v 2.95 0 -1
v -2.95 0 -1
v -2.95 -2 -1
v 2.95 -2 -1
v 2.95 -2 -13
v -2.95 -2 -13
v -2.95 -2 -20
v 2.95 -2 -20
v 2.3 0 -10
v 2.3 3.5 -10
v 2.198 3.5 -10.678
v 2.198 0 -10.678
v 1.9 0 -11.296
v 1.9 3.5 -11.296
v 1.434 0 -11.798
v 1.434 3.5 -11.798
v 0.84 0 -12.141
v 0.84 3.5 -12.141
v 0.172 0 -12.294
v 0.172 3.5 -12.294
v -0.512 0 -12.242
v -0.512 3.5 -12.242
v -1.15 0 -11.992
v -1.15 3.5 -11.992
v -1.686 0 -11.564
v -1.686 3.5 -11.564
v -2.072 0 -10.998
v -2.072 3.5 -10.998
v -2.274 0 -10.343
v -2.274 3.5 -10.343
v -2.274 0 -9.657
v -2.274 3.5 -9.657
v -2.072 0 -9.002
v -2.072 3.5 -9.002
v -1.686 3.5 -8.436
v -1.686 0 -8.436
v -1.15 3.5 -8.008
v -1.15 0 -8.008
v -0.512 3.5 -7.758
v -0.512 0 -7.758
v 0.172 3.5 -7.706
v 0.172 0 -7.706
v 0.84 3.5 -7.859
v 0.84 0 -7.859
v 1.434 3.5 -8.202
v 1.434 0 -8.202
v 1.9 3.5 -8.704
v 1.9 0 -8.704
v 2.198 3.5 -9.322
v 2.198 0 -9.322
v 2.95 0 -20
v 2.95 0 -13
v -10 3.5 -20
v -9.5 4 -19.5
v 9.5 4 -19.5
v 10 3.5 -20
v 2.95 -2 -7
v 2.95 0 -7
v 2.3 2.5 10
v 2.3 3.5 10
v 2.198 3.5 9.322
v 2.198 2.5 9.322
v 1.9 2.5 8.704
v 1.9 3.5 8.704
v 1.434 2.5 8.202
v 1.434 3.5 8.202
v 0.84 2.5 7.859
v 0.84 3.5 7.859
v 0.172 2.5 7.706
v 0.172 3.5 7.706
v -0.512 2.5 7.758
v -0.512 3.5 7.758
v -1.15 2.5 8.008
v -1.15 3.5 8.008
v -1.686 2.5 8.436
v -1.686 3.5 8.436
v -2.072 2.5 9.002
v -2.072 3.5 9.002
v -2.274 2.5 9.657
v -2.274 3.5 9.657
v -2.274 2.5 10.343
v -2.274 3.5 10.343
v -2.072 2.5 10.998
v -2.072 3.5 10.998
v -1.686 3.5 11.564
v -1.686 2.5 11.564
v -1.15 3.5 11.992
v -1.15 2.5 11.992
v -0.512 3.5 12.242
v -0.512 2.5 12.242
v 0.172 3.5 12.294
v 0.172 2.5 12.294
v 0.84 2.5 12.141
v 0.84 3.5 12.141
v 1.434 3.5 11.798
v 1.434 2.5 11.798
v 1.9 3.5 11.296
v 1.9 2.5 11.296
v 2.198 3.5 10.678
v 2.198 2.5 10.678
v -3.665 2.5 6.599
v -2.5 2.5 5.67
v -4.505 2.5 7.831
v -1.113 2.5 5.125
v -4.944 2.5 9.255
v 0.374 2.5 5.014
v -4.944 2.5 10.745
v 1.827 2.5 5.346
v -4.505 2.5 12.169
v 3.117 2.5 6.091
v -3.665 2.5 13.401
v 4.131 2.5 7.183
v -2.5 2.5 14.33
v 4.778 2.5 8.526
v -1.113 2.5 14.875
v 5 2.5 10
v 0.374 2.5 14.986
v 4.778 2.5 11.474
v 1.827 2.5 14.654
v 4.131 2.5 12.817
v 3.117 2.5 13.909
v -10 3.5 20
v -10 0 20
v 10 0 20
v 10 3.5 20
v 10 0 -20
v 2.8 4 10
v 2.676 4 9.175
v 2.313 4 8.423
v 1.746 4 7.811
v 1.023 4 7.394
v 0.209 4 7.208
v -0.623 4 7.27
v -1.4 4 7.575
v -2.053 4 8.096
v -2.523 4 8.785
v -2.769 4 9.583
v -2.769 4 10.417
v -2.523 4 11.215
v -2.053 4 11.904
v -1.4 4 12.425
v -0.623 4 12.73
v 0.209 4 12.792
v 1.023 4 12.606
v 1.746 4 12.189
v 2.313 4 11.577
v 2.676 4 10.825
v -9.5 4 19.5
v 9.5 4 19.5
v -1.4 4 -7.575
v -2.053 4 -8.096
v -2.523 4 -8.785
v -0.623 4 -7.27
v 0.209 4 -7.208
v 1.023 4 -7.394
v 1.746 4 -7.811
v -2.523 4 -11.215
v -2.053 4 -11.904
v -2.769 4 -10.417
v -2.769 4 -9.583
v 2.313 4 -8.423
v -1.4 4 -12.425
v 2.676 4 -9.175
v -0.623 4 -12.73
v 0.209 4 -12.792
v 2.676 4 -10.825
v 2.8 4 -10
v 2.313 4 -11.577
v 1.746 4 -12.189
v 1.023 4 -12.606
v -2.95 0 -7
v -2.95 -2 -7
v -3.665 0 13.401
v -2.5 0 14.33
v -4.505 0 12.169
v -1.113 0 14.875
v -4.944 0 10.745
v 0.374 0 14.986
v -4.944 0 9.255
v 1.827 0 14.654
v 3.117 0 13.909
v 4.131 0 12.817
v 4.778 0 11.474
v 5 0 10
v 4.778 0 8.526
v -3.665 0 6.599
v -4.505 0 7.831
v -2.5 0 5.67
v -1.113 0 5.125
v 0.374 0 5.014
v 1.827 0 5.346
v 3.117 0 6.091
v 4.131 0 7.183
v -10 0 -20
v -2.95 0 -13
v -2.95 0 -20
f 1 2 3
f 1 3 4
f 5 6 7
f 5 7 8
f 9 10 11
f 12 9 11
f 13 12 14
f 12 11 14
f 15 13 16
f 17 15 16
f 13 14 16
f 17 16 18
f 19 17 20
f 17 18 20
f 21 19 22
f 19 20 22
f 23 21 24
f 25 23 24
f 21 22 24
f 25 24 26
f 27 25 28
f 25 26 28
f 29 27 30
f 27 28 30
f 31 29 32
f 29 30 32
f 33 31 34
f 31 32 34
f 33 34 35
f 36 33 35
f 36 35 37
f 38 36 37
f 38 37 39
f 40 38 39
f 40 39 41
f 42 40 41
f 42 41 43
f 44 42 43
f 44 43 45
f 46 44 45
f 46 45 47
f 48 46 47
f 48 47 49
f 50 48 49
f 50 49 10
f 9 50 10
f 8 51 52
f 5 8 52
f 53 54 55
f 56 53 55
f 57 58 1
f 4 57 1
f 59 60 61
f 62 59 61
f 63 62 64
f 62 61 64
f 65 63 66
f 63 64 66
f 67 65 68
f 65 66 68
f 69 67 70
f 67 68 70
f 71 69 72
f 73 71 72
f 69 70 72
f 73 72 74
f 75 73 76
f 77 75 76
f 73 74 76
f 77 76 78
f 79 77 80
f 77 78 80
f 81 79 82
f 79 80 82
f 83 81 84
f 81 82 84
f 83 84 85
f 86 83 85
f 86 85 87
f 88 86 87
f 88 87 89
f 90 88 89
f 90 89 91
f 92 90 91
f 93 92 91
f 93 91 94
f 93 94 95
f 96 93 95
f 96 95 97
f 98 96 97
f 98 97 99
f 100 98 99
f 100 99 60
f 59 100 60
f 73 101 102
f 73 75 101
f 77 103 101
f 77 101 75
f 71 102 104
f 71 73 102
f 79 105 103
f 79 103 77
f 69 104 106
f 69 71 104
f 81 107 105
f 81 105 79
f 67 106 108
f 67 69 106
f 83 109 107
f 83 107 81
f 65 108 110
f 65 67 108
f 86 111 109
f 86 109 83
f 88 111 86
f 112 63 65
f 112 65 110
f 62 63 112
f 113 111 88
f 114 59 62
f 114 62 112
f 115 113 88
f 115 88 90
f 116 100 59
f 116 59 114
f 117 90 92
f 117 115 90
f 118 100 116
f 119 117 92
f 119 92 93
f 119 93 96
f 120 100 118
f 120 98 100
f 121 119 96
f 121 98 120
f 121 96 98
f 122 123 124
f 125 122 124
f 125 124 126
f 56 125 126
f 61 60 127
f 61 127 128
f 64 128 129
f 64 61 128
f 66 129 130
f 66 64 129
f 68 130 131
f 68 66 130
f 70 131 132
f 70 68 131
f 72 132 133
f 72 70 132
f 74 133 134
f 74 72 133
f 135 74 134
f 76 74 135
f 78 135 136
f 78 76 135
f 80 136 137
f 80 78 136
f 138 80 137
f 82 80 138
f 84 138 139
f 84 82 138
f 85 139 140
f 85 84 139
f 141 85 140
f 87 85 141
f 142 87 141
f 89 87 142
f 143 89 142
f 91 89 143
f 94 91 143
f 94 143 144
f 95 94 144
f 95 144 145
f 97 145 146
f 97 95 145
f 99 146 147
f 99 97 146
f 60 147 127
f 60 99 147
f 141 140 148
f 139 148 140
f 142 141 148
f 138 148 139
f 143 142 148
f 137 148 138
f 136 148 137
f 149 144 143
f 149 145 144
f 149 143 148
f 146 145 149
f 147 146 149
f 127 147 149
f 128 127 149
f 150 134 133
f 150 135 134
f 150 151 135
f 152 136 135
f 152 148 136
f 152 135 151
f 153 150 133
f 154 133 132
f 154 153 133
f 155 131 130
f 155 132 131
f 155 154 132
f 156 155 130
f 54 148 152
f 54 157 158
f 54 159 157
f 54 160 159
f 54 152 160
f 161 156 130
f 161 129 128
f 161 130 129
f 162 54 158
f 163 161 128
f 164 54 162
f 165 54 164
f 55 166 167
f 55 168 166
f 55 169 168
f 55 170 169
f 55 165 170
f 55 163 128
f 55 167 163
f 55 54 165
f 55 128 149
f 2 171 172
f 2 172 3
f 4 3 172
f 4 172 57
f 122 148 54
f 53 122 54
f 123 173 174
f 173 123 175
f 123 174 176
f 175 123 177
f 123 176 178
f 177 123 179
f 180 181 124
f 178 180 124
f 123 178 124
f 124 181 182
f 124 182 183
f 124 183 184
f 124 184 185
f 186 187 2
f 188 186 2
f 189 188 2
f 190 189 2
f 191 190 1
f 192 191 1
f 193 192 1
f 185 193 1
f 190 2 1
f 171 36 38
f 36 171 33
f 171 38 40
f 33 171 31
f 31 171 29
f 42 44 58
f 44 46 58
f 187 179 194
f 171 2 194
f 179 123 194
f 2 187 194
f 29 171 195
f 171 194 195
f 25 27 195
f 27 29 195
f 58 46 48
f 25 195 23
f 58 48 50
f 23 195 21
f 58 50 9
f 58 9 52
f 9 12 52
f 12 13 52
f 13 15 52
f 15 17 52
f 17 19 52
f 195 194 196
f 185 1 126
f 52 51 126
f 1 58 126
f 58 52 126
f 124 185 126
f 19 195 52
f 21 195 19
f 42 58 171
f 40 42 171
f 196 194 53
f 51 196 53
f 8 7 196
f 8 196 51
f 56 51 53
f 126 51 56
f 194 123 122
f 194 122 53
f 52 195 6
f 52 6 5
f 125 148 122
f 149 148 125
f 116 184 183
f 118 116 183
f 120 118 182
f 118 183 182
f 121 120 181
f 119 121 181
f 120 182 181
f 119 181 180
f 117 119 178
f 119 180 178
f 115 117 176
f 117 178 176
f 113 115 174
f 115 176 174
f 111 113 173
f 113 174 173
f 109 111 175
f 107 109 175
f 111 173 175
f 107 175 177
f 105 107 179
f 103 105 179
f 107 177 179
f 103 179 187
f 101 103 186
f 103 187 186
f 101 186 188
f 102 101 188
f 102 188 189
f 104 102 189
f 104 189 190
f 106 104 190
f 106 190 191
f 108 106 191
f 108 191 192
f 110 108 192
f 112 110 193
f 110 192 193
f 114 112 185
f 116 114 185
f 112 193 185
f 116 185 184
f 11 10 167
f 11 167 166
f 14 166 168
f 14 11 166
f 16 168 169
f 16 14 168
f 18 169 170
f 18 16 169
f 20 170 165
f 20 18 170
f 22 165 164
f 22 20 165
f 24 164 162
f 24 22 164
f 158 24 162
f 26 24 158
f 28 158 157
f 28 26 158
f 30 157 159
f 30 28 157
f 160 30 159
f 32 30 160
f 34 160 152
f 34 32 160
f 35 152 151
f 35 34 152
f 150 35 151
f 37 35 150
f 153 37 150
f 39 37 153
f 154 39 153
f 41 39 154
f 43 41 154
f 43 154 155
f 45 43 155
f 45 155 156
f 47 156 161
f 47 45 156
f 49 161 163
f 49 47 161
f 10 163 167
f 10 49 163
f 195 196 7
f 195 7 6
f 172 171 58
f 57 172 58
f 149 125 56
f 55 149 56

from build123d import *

# Parameters (mm, degrees)
ESBO_O1_W                  = 20
ESBO_O1_H                  = 40
RESSALTO_EXTRUS_O1_DEPTH   = 4
ESBO_O2_R                  = 2.3
CORTE_EXTRUS_O1_DEPTH      = 1
CORTE_EXTRUS_O1_DEPTH_BACK = 5
ESBO_O3_W                  = 5.9
ESBO_O3_H                  = 6
ESBO_O3_H_2                = 7
RESSALTO_EXTRUS_O2_DEPTH   = 2
CHANFRO1_SIZE              = 0.5
ESBO_O4_R                  = 5
CORTE_EXTRUS_O2_DEPTH      = 2.5


with BuildPart() as part:
    # Esboço1 → Ressalto-extrusão1 (new body)
    with BuildSketch(Plane(origin=(0, 0, 0), x_dir=(1, 0, 0), z_dir=(0, 1, 0))):
        Rectangle(ESBO_O1_W, ESBO_O1_H)
    extrude(amount=RESSALTO_EXTRUS_O1_DEPTH)

    # Esboço2 → Corte-extrusão1 (cut, two sides)
    with BuildSketch(Plane(origin=(0, 4, 0), x_dir=(1, 0, 0), z_dir=(0, 1, 0))) as corte_extrus_o1_sk:
        with Locations((0, 10)):
            Circle(ESBO_O2_R)
        with Locations((0, -10)):
            Circle(ESBO_O2_R)
    extrude(amount=CORTE_EXTRUS_O1_DEPTH, mode=Mode.SUBTRACT)
    extrude(corte_extrus_o1_sk.sketch, amount=-CORTE_EXTRUS_O1_DEPTH_BACK, mode=Mode.SUBTRACT)

    # Esboço3 → Ressalto-extrusão2 (add)
    with BuildSketch(Plane.XZ):
        with Locations((0, -4)):
            Rectangle(ESBO_O3_W, ESBO_O3_H)
        with Locations((0, -16.5)):
            Rectangle(ESBO_O3_W, ESBO_O3_H_2)
    extrude(amount=RESSALTO_EXTRUS_O2_DEPTH)

    # Chanfro1
    chanfro1_edges = [part.edges().sort_by_distance(p)[0] for p in [
        (-10, 4, 0),
        (0, 4, 20),
        (-2.3, 4, -10),
        (-2.3, 4, 10),
        (10, 4, 0),
        (0, 4, -20),
    ]]
    chamfer(chanfro1_edges, length=CHANFRO1_SIZE)

    # Esboço4 → Corte-extrusão2 (cut)
    with BuildSketch(Plane.XZ):
        with Locations((0, 10)):
            Circle(ESBO_O4_R)
    extrude(amount=-CORTE_EXTRUS_O2_DEPTH, mode=Mode.SUBTRACT)


solid = part.part
